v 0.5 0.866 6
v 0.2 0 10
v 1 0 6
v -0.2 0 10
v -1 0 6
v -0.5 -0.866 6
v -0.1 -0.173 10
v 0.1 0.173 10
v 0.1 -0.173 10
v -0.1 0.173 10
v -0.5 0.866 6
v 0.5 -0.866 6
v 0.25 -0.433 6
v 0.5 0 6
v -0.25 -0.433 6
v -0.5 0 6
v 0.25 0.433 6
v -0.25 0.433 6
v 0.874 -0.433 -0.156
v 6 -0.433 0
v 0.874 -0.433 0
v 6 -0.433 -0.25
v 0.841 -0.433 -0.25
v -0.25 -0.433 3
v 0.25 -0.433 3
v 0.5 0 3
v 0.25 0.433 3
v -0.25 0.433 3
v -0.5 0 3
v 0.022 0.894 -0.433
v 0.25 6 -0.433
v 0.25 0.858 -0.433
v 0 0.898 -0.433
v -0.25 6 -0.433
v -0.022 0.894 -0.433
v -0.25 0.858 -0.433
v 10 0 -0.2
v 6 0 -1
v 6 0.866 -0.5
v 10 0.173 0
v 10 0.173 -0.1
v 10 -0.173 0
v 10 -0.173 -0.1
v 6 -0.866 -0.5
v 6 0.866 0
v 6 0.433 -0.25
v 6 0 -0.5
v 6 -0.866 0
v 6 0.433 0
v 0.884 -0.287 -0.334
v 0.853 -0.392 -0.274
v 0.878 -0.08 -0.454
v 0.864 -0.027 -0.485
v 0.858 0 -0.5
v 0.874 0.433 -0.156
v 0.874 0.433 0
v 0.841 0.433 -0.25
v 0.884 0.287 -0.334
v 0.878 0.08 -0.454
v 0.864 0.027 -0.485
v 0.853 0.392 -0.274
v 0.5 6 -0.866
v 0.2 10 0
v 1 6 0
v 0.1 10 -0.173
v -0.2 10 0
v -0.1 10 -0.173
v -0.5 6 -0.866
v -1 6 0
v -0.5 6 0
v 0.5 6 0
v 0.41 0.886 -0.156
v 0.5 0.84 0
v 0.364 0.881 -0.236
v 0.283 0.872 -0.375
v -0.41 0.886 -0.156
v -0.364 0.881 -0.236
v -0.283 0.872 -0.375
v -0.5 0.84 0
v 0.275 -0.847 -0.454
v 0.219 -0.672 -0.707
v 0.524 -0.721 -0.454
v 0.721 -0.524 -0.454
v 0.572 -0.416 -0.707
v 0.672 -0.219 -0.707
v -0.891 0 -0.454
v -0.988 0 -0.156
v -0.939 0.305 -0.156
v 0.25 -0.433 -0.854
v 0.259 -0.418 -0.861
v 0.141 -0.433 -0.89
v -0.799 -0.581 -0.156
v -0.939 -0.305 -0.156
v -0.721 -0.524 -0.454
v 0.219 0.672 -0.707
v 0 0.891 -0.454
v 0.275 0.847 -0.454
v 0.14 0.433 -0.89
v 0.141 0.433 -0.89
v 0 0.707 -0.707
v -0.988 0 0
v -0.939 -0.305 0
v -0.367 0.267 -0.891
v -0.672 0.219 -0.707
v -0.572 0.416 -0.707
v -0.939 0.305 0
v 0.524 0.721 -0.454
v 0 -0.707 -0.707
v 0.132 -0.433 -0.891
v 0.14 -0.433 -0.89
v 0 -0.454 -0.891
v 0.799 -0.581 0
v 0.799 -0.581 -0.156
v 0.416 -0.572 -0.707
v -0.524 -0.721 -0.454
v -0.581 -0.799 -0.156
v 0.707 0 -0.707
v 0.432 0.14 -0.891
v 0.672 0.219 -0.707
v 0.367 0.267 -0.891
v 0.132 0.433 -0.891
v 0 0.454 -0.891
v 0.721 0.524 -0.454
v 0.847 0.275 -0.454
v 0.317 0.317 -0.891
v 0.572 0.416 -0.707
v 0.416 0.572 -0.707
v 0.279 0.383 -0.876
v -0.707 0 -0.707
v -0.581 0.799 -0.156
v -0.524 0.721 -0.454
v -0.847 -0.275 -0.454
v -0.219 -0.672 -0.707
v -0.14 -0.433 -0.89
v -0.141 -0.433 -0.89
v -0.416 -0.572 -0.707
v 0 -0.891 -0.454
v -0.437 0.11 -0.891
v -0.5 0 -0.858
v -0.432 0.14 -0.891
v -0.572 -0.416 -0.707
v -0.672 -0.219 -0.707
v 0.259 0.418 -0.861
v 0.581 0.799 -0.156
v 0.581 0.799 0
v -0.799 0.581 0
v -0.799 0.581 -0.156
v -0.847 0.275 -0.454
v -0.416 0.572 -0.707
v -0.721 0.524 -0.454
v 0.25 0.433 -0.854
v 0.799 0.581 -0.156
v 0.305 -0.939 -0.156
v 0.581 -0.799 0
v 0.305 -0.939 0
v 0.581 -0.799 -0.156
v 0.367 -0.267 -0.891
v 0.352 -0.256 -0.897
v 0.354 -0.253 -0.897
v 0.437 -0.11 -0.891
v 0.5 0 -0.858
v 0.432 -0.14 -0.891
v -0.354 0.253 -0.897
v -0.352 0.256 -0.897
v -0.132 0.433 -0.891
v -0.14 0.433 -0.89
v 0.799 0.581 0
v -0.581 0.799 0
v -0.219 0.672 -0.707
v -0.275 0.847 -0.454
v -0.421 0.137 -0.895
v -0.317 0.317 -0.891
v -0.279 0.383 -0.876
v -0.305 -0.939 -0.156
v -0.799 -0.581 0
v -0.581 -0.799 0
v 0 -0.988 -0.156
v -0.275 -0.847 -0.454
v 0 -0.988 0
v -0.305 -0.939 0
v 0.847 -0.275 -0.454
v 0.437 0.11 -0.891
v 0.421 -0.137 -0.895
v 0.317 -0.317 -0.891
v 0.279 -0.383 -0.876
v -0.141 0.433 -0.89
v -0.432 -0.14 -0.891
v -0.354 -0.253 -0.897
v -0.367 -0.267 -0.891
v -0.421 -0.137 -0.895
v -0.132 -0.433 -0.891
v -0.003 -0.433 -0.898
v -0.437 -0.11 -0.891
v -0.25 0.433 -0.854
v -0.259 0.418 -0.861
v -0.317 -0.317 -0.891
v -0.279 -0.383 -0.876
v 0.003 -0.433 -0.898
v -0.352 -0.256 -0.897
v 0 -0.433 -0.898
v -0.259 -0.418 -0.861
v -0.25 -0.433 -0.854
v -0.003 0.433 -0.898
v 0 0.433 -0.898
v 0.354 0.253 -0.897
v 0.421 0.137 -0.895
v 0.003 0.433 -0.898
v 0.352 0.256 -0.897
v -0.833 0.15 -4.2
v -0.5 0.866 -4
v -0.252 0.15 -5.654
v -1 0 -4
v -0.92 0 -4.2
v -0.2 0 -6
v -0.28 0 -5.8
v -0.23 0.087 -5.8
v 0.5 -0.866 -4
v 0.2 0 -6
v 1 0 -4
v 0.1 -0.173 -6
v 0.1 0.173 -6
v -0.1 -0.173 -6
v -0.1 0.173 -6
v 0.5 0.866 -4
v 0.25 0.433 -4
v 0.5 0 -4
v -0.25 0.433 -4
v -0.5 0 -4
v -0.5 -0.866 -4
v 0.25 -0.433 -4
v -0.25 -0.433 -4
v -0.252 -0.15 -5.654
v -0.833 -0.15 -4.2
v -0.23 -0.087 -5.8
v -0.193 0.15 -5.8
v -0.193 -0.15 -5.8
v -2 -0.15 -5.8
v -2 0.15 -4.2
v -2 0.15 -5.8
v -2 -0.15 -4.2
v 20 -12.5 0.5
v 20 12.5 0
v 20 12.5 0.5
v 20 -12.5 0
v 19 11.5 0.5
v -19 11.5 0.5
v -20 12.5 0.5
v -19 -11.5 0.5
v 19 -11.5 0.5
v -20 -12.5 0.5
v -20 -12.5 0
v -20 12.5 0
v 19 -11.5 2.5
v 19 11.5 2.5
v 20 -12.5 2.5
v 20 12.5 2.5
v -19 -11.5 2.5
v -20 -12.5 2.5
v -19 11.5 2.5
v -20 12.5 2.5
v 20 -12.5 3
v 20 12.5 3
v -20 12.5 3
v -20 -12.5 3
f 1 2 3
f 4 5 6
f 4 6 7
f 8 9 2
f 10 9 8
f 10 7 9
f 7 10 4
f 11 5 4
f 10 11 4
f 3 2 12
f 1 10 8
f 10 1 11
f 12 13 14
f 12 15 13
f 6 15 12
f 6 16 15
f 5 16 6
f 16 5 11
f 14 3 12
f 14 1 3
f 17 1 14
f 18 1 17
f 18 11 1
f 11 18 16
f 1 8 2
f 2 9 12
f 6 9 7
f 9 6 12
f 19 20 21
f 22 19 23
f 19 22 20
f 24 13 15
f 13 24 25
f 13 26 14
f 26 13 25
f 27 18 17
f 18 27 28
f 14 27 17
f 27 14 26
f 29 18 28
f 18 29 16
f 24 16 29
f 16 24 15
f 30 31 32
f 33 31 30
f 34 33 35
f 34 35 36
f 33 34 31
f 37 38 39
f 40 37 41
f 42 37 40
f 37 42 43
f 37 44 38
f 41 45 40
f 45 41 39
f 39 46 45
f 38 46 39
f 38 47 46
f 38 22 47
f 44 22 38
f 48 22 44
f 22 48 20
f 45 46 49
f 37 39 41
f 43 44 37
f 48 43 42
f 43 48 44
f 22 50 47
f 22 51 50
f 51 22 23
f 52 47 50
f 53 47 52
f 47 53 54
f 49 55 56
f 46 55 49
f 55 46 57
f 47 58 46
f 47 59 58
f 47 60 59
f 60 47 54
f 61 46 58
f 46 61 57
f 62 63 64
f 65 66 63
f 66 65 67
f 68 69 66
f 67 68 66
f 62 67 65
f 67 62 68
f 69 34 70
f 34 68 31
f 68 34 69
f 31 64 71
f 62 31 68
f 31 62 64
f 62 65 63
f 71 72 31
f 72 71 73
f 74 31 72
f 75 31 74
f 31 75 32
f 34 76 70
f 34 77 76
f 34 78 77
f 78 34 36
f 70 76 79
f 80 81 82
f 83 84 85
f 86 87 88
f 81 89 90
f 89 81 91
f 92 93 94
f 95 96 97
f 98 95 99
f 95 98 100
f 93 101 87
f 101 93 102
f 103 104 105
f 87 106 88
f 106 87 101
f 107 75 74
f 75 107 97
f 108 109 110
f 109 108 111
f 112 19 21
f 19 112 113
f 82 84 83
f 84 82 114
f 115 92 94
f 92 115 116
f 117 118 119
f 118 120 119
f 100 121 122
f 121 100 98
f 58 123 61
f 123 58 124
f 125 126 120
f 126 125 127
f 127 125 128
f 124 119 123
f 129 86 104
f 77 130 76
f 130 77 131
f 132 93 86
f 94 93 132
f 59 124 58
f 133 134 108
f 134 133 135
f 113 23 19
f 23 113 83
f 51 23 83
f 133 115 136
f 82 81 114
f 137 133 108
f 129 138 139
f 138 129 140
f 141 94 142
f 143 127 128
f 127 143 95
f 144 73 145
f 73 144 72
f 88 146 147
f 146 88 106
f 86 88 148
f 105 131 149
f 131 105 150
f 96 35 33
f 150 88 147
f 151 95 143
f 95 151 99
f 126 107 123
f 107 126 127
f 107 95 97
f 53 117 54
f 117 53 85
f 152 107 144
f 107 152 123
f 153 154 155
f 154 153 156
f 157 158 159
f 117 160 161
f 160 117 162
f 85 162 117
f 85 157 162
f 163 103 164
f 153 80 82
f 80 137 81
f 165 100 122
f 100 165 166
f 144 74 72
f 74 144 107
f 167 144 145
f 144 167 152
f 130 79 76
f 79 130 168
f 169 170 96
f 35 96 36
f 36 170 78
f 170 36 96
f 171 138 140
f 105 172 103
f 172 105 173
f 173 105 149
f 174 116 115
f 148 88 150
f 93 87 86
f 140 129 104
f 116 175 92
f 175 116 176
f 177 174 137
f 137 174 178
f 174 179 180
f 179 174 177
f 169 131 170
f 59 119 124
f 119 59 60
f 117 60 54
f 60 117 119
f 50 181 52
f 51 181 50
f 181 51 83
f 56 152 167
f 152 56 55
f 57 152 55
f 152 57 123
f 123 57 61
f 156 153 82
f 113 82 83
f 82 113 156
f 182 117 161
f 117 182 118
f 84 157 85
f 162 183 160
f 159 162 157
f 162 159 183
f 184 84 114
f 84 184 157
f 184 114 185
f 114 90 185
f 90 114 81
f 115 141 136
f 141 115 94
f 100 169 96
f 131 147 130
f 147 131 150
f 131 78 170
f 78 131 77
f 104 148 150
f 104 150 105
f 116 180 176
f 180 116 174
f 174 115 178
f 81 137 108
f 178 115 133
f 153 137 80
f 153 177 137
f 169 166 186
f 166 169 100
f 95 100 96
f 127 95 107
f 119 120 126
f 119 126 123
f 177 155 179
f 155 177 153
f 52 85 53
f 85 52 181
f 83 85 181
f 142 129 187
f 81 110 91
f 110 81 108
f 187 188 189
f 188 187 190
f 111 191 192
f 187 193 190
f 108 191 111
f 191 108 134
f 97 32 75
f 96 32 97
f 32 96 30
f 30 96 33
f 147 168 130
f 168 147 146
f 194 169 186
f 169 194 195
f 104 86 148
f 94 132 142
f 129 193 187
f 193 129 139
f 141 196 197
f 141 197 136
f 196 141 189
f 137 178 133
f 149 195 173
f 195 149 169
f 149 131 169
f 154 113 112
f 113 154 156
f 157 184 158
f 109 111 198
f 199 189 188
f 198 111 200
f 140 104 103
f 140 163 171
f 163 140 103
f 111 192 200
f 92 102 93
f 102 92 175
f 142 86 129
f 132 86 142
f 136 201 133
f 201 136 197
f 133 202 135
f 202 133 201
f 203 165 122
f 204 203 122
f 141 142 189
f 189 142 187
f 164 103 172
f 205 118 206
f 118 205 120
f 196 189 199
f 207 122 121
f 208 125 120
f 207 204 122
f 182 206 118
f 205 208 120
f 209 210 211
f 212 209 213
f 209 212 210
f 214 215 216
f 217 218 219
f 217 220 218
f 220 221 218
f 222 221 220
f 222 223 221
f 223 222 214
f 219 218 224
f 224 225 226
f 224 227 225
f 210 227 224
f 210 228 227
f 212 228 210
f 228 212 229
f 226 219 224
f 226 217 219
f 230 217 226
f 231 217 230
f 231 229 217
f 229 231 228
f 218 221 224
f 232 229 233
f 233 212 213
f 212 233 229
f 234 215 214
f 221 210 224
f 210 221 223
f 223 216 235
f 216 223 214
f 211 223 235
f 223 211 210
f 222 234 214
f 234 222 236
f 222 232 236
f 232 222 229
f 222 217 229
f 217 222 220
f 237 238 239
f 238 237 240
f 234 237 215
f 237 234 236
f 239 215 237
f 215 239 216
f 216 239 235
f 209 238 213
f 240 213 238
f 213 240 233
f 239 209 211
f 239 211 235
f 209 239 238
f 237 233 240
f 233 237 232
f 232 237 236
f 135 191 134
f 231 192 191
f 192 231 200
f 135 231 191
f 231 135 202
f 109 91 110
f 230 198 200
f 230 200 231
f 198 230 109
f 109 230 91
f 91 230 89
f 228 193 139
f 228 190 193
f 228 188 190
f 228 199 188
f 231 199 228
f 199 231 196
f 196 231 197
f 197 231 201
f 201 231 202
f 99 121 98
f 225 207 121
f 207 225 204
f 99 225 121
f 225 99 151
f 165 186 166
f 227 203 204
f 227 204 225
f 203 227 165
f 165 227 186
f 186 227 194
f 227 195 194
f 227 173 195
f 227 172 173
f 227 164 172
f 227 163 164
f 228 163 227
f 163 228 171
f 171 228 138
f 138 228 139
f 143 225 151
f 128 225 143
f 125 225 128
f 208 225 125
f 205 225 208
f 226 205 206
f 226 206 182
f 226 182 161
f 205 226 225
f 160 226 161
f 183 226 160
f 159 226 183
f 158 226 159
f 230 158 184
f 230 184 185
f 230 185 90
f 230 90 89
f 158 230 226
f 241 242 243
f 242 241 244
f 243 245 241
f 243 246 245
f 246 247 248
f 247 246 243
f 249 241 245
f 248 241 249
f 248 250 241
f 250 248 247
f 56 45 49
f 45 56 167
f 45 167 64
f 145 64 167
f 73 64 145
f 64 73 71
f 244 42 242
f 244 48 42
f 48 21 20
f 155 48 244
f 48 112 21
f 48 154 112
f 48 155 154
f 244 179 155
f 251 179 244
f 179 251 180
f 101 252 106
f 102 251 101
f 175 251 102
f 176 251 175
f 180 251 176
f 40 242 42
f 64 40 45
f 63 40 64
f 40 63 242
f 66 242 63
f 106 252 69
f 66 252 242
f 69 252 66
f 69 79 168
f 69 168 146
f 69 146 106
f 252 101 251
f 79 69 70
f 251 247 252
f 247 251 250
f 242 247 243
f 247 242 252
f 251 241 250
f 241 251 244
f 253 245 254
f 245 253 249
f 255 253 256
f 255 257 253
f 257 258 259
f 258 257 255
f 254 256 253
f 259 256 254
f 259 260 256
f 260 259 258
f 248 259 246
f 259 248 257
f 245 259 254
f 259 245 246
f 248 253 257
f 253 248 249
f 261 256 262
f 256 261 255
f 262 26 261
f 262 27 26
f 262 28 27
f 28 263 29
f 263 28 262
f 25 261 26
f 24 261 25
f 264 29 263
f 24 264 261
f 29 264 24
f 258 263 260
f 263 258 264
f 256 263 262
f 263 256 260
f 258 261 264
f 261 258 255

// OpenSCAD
include <../config/config.scad>
UseSTL=false;
UseVitaminSTL=true;
DebugConnectors=true;
DebugCoordinateFrames=true;
HookAndLoopTape();
